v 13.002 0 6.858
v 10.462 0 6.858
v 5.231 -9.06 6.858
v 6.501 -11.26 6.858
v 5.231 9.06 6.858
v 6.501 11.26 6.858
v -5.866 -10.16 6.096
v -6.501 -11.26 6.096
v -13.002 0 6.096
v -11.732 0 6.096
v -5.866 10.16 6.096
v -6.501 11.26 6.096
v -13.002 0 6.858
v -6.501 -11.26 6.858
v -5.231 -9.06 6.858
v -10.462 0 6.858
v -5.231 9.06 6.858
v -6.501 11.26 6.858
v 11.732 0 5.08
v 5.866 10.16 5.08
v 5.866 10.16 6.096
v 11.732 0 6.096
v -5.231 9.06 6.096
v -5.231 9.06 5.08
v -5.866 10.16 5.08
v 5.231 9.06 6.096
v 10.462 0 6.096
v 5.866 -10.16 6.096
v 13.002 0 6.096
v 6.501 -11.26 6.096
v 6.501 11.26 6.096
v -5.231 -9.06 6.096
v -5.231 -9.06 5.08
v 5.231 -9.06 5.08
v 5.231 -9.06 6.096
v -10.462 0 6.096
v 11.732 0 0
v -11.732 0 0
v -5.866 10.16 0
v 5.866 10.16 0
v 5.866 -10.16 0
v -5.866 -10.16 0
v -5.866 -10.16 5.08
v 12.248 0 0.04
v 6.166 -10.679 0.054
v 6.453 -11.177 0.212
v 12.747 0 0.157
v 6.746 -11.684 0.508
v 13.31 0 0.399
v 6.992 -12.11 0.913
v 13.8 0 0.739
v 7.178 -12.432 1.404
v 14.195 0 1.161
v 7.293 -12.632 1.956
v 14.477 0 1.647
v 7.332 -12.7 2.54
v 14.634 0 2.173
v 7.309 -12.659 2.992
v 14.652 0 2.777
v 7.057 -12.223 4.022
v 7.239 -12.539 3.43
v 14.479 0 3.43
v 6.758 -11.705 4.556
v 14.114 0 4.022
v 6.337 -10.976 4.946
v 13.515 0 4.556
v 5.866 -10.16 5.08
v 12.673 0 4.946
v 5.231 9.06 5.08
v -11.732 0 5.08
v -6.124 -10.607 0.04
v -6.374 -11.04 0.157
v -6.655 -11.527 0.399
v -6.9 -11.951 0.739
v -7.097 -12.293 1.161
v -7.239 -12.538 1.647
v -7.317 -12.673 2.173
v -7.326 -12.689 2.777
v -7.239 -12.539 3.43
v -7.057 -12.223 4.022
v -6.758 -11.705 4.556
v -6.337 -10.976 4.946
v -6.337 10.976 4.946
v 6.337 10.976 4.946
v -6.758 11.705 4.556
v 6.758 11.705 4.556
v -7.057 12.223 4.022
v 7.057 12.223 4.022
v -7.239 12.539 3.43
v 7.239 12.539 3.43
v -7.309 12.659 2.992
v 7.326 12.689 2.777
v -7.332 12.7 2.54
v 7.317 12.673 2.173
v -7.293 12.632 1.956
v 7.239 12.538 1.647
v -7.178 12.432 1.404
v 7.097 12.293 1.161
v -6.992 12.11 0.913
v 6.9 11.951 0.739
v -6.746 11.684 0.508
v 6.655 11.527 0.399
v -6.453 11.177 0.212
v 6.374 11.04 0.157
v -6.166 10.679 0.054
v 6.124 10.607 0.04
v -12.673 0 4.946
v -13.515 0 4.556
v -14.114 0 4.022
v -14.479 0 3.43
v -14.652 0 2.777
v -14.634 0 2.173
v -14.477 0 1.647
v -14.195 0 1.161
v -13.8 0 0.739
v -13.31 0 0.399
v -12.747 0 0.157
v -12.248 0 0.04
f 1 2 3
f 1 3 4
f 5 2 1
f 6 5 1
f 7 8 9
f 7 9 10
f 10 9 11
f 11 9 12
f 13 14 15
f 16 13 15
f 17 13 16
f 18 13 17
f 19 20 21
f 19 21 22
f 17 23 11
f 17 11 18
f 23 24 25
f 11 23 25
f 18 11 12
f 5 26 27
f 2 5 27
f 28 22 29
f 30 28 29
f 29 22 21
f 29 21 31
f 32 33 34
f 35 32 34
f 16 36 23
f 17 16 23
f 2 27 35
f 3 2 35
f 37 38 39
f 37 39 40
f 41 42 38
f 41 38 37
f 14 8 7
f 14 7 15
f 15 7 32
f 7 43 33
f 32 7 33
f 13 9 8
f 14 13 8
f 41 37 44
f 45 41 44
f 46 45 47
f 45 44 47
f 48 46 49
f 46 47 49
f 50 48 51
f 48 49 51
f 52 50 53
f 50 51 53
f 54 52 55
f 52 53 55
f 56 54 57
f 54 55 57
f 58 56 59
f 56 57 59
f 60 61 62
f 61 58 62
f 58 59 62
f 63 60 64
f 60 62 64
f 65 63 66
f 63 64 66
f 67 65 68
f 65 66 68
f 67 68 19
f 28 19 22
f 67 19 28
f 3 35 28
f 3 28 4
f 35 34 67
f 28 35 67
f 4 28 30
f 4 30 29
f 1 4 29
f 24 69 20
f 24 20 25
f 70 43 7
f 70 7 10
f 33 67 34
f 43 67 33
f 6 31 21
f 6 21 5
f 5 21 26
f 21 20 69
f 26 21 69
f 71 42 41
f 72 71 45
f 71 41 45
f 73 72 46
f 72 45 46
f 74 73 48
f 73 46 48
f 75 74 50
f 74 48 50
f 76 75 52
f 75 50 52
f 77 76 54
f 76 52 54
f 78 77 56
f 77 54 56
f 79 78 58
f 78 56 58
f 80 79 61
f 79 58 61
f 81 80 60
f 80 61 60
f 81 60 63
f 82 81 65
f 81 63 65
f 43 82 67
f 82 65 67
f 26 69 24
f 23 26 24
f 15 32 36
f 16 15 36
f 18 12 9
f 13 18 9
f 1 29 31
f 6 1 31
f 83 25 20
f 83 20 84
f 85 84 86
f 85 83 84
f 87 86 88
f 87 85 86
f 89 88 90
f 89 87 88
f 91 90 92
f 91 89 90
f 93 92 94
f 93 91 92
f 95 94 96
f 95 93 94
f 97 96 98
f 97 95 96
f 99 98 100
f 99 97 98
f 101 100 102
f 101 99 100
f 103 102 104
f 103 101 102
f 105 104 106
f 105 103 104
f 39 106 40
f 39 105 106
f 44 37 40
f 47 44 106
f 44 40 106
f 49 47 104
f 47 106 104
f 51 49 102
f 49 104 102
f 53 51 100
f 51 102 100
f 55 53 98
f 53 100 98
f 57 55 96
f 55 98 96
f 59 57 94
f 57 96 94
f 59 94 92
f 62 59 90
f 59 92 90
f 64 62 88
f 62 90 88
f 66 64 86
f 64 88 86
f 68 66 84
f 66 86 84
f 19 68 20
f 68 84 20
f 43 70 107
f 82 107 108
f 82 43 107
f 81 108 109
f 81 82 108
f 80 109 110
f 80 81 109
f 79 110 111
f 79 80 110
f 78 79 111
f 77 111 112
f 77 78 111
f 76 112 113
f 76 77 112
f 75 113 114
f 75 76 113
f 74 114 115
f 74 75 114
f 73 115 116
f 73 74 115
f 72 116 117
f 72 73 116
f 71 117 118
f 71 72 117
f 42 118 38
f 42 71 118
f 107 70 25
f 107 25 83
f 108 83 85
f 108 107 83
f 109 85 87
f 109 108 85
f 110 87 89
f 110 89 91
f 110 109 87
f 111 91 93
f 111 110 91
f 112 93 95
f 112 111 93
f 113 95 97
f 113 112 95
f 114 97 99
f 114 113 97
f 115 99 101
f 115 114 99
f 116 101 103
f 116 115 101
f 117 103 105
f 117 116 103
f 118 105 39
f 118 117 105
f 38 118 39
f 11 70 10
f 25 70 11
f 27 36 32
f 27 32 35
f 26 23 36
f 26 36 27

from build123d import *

# Parameters (mm, degrees)
F1_DEPTH  = 12.7
F3_DEPTH  = 25.4
F6_DEPTH  = 25.4
F9_DEPTH  = 25.4
F11_DEPTH = 1.778
F12_DEPTH = 1.016
F13_DEPTH = 1.016


with BuildPart() as f1:
    # F0 (on Front) → F1 (new body, symmetric)
    with BuildSketch(Plane.XZ):
        with BuildLine():
            Line((-12.7, 0), (0, 0))
            Line((0, 0), (12.7, 0))
            ThreePointArc((12.7, 0), (15.24, 2.54), (12.7, 5.08))
            Line((12.7, 5.08), (-12.7, 5.08))
            ThreePointArc((-12.7, 5.08), (-15.24, 2.54), (-12.7, 0))
        make_face()
    extrude(amount=F1_DEPTH, both=True)

    # F2 (on Right) → F3 (cut, symmetric)
    with BuildSketch(Plane.YZ):
        with BuildLine():
            ThreePointArc((10.16, 5.08), (12.7, 2.54), (10.16, 0))
            Line((10.16, 0), (29.21, 0))
            Line((29.21, 0), (29.21, 5.08))
            Line((29.21, 5.08), (10.16, 5.08))
        make_face()
        with BuildLine():
            ThreePointArc((-10.16, 0), (-12.7, 2.54), (-10.16, 5.08))
            Line((-10.16, 5.08), (-29.21, 5.08))
            Line((-29.21, 5.08), (-29.21, 0))
            Line((-29.21, 0), (-10.16, 0))
        make_face()
    extrude(amount=F3_DEPTH, both=True, mode=Mode.SUBTRACT)

    # F5 (on line) → F6 (cut, symmetric)
    with BuildSketch(Plane(origin=(0, 0, 0), x_dir=(-0.8660254038, -0.5, 0), z_dir=(-0.5, 0.8660254038, 0))):
        with BuildLine():
            ThreePointArc((10.16, 5.08), (12.7, 2.54), (10.16, 0))
            Line((10.16, 0), (29.21, 0))
            Line((29.21, 0), (29.21, 5.08))
            Line((29.21, 5.08), (10.16, 5.08))
        make_face()
        with BuildLine():
            ThreePointArc((-10.16, 0), (-12.7, 2.54), (-10.16, 5.08))
            Line((-10.16, 5.08), (-29.21, 5.08))
            Line((-29.21, 5.08), (-29.21, 0))
            Line((-29.21, 0), (-10.16, 0))
        make_face()
    extrude(amount=F6_DEPTH, both=True, mode=Mode.SUBTRACT)

    # F8 (on line) → F9 (cut, symmetric)
    with BuildSketch(Plane(origin=(0, 0, 0), x_dir=(-0.8660254038, 0.5, 0), z_dir=(0.5, 0.8660254038, 0))):
        with BuildLine():
            ThreePointArc((10.16, 5.08), (12.7, 2.54), (10.16, 0))
            Line((10.16, 0), (29.21, 0))
            Line((29.21, 0), (29.21, 5.08))
            Line((29.21, 5.08), (10.16, 5.08))
        make_face()
        with BuildLine():
            ThreePointArc((-10.16, 0), (-12.7, 2.54), (-10.16, 5.08))
            Line((-10.16, 5.08), (-29.21, 5.08))
            Line((-29.21, 5.08), (-29.21, 0))
            Line((-29.21, 0), (-10.16, 0))
        make_face()
    extrude(amount=F9_DEPTH, both=True, mode=Mode.SUBTRACT)

    # F10 (on face) → F11 (join)
    with BuildSketch(Plane.XY.offset(5.08)):
        Polygon((-5.230878735, 9.0601477372), (-5.865878735, 10.16), (-11.7317574699, 0), (-5.865878735, -10.16), (-5.230878735, -9.0601477372), (-10.4617574699, 0), align=None)
        Polygon((-11.7317574699, 0), (-5.865878735, 10.16), (-6.500878735, 11.2598522628), (-13.0017574699, 0), (-6.500878735, -11.2598522628), (-5.865878735, -10.16), align=None)
        Polygon((11.7317574699, 0), (5.865878735, 10.16), (5.230878735, 9.0601477372), (10.4617574699, 0), (5.230878735, -9.0601477372), (5.865878735, -10.16), align=None)
        Polygon((6.500878735, 11.2598522628), (5.865878735, 10.16), (11.7317574699, 0), (5.865878735, -10.16), (6.500878735, -11.2598522628), (13.0017574699, 0), align=None)
    extrude(amount=F11_DEPTH)

    # F10 (on face) → F12 (cut)
    with BuildSketch(Plane.XY.offset(5.08)):
        Polygon((6.500878735, 11.2598522628), (5.865878735, 10.16), (11.7317574699, 0), (5.865878735, -10.16), (6.500878735, -11.2598522628), (13.0017574699, 0), align=None)
        Polygon((-11.7317574699, 0), (-5.865878735, 10.16), (-6.500878735, 11.2598522628), (-13.0017574699, 0), (-6.500878735, -11.2598522628), (-5.865878735, -10.16), align=None)
    extrude(amount=F12_DEPTH, mode=Mode.SUBTRACT)

    # F10 (on face) → F13 (join)
    with BuildSketch(Plane.XY.offset(5.08)):
        Polygon((10.4617574699, 0), (5.230878735, 9.0601477372), (-5.230878735, 9.0601477372), (-10.4617574699, 0), (-5.230878735, -9.0601477372), (5.230878735, -9.0601477372), align=None)
    extrude(amount=F13_DEPTH)


solid = f1.part
